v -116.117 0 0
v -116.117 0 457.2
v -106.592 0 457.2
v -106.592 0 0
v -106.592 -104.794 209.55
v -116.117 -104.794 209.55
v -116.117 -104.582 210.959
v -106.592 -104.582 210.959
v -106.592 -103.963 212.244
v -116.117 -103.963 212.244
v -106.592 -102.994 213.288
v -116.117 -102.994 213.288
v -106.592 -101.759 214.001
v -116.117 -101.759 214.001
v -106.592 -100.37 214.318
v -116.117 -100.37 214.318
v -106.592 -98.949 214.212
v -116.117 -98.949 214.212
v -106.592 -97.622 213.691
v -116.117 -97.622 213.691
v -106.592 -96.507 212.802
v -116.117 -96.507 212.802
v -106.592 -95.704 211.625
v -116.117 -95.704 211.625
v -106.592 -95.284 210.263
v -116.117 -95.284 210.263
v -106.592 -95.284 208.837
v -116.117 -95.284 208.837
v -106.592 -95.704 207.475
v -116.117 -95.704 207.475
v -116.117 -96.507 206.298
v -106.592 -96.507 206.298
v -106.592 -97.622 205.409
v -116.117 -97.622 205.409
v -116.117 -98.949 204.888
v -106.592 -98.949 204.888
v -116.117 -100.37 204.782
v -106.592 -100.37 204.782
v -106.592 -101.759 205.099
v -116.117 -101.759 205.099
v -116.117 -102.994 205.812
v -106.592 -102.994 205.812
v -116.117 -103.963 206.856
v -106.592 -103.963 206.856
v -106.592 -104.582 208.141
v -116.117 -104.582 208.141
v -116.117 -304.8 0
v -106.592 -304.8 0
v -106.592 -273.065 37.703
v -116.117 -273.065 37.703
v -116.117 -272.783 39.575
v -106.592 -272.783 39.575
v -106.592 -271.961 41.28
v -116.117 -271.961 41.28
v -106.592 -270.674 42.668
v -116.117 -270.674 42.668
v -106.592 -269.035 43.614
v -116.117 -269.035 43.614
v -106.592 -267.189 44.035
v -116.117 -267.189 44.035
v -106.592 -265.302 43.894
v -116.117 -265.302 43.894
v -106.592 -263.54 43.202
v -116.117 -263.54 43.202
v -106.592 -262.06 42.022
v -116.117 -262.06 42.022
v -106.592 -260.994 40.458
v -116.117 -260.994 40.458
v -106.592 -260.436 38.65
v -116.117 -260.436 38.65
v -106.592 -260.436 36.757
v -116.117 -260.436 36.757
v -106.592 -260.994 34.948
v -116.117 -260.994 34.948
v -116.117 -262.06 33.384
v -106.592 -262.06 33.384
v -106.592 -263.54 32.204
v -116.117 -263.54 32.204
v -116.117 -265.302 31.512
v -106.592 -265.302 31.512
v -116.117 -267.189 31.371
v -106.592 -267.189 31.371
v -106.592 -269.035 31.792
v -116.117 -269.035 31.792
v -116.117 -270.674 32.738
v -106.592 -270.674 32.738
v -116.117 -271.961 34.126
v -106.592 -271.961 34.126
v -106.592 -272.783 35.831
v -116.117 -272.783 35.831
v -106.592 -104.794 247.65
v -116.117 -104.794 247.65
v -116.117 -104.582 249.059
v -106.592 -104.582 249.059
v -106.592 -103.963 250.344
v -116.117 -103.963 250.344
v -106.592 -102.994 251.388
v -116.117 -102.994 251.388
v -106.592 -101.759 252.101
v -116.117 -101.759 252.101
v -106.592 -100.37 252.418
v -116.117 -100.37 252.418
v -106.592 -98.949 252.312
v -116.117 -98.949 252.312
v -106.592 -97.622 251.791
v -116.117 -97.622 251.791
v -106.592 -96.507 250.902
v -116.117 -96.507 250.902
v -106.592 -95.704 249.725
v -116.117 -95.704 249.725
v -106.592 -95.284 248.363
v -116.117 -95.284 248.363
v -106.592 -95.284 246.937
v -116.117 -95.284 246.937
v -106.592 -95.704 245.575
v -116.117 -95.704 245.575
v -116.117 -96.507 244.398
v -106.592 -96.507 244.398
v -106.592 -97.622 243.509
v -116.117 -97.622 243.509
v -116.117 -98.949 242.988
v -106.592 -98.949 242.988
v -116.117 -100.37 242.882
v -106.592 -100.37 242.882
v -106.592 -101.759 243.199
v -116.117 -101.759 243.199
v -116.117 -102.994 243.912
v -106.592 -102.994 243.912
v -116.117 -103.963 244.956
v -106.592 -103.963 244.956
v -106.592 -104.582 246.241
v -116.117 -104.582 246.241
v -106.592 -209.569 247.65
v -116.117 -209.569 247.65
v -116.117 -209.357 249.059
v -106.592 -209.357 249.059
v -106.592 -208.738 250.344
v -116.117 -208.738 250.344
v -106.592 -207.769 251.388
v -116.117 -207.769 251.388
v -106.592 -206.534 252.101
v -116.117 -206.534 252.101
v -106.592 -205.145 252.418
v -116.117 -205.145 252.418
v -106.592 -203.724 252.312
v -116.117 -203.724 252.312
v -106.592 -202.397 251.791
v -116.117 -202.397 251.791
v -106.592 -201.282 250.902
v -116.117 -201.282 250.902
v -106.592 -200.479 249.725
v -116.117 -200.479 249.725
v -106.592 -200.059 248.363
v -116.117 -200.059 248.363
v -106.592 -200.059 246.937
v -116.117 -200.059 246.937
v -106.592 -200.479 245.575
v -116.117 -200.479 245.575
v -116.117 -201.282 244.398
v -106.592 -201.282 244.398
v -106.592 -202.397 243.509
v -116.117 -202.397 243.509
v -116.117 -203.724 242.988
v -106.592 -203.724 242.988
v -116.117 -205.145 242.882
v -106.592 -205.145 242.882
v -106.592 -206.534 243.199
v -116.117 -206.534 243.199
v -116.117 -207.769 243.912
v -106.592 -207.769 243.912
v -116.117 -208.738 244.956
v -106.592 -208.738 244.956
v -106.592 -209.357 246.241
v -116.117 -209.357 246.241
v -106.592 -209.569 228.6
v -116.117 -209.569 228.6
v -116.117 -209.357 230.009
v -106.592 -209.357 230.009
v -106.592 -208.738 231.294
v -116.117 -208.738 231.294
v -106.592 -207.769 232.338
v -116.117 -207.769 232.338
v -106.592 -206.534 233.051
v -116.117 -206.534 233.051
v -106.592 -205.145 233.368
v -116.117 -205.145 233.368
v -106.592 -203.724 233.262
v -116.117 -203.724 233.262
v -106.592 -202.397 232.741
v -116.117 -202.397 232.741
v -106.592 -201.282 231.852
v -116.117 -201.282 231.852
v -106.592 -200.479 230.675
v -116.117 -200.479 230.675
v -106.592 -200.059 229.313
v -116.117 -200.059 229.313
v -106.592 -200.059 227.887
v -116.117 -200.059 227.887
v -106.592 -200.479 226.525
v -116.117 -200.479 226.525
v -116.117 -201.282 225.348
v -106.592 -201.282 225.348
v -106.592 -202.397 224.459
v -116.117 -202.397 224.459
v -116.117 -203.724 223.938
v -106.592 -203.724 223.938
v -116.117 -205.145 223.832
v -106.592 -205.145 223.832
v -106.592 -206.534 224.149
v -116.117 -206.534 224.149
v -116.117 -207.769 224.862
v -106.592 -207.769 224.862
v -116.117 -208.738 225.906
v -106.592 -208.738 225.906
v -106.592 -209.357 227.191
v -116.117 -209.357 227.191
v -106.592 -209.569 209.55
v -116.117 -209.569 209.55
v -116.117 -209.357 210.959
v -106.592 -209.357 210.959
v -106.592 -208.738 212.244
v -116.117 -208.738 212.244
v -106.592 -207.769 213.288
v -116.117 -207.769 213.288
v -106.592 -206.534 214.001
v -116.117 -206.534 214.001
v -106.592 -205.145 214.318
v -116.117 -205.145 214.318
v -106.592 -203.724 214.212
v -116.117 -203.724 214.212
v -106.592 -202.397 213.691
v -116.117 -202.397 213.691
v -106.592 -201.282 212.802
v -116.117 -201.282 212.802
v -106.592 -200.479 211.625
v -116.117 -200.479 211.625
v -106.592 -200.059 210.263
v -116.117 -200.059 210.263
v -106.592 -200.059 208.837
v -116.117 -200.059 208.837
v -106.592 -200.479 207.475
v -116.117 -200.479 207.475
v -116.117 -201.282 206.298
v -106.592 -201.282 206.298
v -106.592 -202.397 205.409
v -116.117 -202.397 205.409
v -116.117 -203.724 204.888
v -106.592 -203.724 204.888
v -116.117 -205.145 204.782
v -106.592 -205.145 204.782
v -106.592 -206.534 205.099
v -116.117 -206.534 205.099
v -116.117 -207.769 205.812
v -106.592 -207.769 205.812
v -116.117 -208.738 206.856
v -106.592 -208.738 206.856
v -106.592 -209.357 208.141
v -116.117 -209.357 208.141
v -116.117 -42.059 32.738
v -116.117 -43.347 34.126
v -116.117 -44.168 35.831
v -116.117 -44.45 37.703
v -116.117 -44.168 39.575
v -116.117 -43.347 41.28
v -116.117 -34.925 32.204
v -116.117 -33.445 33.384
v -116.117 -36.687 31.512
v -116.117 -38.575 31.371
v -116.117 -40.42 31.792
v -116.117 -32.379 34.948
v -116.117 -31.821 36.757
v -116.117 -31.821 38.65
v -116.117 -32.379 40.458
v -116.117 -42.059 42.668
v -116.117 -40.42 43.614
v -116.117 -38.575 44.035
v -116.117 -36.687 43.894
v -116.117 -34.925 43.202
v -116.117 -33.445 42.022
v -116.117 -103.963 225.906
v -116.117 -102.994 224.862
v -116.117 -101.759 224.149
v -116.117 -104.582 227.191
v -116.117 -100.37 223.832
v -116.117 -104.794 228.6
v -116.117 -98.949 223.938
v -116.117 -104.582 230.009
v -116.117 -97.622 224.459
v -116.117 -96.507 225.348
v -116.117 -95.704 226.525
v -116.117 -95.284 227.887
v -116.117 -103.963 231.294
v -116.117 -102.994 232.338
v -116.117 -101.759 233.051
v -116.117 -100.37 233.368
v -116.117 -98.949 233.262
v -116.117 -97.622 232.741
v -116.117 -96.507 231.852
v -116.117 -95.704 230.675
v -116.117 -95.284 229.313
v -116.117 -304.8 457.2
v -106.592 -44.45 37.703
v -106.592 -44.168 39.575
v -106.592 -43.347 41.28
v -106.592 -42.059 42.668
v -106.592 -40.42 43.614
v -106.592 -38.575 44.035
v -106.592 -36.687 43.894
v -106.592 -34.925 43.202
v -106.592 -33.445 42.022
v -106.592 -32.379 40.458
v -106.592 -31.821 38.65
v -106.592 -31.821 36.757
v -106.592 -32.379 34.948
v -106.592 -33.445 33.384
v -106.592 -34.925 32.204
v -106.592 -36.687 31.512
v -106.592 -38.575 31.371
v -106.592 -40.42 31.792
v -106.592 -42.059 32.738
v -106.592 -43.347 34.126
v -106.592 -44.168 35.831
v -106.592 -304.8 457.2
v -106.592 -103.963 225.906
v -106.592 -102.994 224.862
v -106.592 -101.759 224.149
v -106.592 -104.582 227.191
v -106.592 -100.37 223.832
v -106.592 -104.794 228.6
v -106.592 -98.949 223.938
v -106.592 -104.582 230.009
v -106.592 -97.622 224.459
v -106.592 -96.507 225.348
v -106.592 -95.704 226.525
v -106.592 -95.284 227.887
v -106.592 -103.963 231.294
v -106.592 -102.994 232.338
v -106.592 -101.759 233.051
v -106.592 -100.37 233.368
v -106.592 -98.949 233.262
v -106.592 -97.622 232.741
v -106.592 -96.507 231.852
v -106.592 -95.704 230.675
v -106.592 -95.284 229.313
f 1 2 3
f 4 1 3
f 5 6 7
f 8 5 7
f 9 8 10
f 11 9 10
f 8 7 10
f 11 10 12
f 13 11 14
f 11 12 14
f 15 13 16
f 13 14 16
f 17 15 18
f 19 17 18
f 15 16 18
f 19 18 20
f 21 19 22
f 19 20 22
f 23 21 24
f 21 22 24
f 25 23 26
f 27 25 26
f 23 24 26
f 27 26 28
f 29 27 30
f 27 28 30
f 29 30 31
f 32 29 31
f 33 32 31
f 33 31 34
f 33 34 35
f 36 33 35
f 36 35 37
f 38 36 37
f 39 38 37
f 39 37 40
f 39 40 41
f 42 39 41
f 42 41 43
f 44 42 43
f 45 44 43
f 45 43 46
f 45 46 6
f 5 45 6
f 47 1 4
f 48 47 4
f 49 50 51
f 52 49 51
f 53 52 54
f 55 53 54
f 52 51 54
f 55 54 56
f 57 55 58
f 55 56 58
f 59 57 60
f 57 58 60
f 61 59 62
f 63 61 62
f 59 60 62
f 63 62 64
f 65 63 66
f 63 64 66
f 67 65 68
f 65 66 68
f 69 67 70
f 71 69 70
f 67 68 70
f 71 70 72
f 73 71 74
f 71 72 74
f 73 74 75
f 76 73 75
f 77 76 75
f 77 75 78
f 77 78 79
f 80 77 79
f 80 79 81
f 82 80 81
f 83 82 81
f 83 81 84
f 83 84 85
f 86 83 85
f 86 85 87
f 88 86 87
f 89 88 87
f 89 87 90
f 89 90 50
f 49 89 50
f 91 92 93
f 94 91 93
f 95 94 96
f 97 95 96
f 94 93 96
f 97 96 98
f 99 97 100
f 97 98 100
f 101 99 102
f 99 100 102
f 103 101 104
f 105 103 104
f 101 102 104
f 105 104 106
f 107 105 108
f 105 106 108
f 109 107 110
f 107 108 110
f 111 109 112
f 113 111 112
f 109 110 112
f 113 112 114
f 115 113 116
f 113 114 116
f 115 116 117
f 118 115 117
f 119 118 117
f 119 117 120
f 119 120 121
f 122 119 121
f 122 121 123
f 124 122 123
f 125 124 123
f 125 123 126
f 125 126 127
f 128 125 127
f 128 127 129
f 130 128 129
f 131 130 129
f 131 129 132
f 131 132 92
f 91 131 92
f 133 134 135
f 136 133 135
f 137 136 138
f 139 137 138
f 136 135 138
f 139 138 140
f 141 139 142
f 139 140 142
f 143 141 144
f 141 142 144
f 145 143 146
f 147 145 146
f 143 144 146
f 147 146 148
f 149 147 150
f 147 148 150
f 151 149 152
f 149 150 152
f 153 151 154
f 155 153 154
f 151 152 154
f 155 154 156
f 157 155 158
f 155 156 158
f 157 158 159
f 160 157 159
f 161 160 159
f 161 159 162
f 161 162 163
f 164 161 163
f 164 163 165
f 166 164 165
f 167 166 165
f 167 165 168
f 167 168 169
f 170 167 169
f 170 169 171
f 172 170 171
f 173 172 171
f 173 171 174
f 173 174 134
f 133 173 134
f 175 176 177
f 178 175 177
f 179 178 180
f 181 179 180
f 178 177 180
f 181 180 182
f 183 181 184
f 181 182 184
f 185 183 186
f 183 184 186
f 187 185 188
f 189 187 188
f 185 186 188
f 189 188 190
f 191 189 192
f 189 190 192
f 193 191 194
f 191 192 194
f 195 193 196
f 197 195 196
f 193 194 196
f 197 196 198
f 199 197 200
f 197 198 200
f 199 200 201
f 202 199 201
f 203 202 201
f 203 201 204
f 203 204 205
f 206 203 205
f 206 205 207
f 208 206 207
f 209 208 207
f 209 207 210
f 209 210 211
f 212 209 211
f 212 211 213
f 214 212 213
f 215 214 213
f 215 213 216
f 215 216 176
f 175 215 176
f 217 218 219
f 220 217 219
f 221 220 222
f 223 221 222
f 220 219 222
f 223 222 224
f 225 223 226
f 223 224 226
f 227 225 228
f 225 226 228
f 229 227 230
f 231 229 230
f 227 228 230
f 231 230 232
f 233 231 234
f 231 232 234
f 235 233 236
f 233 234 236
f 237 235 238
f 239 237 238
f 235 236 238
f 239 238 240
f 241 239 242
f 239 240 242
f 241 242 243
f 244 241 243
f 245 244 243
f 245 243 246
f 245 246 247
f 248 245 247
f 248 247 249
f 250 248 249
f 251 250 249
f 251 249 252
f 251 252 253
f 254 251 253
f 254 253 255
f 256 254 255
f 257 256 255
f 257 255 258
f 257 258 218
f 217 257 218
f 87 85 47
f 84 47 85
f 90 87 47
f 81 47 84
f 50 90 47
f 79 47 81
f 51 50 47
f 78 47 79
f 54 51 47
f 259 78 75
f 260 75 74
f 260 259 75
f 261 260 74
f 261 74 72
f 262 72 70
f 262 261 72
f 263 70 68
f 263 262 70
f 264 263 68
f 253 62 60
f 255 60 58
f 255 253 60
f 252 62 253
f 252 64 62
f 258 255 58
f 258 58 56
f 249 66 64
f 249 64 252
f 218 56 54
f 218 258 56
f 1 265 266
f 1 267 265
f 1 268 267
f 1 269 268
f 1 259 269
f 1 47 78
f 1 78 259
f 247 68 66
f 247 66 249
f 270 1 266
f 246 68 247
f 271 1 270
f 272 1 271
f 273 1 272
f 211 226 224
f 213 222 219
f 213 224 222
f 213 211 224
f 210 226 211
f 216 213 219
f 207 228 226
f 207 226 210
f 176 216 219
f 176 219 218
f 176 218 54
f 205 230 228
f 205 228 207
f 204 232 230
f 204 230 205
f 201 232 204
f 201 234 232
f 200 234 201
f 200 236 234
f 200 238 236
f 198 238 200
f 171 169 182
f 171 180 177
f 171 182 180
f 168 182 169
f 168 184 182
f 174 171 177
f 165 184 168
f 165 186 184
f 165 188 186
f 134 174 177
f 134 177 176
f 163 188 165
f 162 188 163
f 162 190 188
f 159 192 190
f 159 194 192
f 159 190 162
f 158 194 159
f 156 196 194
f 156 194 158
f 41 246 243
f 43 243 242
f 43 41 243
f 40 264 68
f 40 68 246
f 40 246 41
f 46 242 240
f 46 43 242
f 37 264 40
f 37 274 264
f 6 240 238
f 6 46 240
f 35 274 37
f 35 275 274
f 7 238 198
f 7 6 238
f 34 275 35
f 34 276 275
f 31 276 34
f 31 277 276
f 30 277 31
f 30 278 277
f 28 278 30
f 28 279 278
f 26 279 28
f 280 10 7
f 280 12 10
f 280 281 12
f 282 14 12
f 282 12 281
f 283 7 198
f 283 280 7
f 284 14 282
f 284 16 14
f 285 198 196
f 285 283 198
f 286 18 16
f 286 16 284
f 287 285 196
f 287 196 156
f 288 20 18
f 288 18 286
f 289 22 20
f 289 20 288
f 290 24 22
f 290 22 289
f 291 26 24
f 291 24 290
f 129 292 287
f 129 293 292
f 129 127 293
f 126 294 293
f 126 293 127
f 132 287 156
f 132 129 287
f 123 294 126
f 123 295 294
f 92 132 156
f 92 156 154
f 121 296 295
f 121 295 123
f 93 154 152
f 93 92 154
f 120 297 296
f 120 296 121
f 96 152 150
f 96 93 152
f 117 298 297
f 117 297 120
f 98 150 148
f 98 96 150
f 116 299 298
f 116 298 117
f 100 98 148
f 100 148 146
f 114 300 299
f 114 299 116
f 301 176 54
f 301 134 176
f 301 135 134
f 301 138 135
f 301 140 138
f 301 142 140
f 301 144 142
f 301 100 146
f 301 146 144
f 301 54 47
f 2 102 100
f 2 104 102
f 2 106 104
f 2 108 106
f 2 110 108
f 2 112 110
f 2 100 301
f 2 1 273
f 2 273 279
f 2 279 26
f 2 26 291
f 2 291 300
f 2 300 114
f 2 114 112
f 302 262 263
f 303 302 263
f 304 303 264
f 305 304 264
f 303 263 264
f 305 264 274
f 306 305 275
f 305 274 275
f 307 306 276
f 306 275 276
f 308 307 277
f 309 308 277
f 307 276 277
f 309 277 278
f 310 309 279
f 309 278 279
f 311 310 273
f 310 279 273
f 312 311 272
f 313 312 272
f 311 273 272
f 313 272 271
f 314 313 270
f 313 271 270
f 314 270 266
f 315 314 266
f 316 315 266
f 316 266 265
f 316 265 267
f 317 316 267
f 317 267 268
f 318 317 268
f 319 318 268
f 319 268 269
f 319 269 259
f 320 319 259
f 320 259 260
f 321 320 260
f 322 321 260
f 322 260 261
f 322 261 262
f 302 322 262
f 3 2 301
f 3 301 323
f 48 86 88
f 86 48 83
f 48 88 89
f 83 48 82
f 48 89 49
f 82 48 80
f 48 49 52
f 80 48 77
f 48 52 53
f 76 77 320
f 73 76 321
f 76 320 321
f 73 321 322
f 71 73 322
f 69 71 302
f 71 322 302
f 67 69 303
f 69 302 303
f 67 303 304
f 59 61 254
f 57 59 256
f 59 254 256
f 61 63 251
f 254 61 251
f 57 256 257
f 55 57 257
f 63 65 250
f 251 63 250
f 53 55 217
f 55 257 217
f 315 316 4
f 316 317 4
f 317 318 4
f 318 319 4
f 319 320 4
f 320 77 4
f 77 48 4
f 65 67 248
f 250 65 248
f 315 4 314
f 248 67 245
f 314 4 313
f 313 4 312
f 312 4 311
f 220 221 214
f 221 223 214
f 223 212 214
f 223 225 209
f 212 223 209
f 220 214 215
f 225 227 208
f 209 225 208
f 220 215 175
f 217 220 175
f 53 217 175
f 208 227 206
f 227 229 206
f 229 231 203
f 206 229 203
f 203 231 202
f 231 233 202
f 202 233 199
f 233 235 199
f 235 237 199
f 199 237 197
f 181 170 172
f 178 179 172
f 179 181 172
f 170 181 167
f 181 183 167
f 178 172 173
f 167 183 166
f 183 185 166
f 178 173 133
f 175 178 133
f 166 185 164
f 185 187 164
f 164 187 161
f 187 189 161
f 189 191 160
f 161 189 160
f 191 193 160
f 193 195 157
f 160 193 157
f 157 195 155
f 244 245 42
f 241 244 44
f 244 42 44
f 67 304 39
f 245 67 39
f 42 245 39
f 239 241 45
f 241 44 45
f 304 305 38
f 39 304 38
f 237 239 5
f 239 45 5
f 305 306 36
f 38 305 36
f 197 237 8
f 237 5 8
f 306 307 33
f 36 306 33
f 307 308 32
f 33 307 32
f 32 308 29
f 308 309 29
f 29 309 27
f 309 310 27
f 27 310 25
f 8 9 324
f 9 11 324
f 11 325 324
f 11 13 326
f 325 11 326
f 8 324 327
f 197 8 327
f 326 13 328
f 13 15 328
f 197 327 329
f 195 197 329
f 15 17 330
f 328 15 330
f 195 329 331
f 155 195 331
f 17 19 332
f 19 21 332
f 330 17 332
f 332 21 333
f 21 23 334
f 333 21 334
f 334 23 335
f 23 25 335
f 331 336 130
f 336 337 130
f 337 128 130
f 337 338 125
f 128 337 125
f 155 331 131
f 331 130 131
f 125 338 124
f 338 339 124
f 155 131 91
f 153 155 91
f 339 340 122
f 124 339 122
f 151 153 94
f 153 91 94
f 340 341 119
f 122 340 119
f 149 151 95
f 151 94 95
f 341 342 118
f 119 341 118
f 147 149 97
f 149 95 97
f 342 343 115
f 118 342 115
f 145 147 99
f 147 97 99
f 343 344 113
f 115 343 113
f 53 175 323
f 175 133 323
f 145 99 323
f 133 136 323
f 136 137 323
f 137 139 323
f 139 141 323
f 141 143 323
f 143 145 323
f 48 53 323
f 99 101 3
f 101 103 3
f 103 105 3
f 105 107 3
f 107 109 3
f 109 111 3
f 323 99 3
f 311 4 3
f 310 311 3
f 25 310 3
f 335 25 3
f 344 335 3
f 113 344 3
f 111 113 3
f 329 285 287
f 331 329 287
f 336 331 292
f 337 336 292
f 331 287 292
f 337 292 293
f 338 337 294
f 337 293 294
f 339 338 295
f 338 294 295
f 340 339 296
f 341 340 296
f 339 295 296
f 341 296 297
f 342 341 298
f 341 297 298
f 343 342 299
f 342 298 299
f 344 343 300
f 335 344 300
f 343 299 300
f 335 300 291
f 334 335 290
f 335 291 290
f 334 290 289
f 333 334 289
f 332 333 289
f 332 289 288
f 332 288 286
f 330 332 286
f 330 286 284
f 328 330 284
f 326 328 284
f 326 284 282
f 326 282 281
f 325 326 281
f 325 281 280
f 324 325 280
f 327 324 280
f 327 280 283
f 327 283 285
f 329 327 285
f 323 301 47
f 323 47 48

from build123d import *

# Parameters (mm, degrees)
F0_W     = 9.525
F0_H     = 457.2
F1_DEPTH = 304.8
F3_R     = 6.35
F4_DEPTH = 9.526
F5_R     = 4.78155
F6_DEPTH = 9.526


with BuildPart() as f1:
    # F0 (on Front) → F1 (new body)
    with BuildSketch(Plane.XZ):
        with Locations((-111.354939, 228.6)):
            Rectangle(F0_W, F0_H)
    extrude(amount=F1_DEPTH)

    # F3 (on face) → F4 (cut, through all)
    with BuildSketch(Plane(origin=(-116.117439, 0, 0), x_dir=(0, -1, 0), z_dir=(-1, 0, 0))):
        with Locations((38.1, 37.703125)):
            Circle(F3_R)
        with Locations((266.7147, 37.703125)):
            Circle(F3_R)
    extrude(amount=-F4_DEPTH, mode=Mode.SUBTRACT)

    # F5 (on face) → F6 (cut, through all)
    with BuildSketch(Plane(origin=(-116.117439, 0, 0), x_dir=(0, -1, 0), z_dir=(-1, 0, 0))):
        with Locations((100.0125, 247.65)):
            Circle(F5_R)
        with Locations((204.7875, 247.65)):
            Circle(F5_R)
        with Locations((100.0125, 228.6)):
            Circle(F5_R)
        with Locations((204.7875, 228.6)):
            Circle(F5_R)
        with Locations((100.0125, 209.55)):
            Circle(F5_R)
        with Locations((204.7875, 209.55)):
            Circle(F5_R)
    extrude(amount=-F6_DEPTH, mode=Mode.SUBTRACT)


solid = f1.part
